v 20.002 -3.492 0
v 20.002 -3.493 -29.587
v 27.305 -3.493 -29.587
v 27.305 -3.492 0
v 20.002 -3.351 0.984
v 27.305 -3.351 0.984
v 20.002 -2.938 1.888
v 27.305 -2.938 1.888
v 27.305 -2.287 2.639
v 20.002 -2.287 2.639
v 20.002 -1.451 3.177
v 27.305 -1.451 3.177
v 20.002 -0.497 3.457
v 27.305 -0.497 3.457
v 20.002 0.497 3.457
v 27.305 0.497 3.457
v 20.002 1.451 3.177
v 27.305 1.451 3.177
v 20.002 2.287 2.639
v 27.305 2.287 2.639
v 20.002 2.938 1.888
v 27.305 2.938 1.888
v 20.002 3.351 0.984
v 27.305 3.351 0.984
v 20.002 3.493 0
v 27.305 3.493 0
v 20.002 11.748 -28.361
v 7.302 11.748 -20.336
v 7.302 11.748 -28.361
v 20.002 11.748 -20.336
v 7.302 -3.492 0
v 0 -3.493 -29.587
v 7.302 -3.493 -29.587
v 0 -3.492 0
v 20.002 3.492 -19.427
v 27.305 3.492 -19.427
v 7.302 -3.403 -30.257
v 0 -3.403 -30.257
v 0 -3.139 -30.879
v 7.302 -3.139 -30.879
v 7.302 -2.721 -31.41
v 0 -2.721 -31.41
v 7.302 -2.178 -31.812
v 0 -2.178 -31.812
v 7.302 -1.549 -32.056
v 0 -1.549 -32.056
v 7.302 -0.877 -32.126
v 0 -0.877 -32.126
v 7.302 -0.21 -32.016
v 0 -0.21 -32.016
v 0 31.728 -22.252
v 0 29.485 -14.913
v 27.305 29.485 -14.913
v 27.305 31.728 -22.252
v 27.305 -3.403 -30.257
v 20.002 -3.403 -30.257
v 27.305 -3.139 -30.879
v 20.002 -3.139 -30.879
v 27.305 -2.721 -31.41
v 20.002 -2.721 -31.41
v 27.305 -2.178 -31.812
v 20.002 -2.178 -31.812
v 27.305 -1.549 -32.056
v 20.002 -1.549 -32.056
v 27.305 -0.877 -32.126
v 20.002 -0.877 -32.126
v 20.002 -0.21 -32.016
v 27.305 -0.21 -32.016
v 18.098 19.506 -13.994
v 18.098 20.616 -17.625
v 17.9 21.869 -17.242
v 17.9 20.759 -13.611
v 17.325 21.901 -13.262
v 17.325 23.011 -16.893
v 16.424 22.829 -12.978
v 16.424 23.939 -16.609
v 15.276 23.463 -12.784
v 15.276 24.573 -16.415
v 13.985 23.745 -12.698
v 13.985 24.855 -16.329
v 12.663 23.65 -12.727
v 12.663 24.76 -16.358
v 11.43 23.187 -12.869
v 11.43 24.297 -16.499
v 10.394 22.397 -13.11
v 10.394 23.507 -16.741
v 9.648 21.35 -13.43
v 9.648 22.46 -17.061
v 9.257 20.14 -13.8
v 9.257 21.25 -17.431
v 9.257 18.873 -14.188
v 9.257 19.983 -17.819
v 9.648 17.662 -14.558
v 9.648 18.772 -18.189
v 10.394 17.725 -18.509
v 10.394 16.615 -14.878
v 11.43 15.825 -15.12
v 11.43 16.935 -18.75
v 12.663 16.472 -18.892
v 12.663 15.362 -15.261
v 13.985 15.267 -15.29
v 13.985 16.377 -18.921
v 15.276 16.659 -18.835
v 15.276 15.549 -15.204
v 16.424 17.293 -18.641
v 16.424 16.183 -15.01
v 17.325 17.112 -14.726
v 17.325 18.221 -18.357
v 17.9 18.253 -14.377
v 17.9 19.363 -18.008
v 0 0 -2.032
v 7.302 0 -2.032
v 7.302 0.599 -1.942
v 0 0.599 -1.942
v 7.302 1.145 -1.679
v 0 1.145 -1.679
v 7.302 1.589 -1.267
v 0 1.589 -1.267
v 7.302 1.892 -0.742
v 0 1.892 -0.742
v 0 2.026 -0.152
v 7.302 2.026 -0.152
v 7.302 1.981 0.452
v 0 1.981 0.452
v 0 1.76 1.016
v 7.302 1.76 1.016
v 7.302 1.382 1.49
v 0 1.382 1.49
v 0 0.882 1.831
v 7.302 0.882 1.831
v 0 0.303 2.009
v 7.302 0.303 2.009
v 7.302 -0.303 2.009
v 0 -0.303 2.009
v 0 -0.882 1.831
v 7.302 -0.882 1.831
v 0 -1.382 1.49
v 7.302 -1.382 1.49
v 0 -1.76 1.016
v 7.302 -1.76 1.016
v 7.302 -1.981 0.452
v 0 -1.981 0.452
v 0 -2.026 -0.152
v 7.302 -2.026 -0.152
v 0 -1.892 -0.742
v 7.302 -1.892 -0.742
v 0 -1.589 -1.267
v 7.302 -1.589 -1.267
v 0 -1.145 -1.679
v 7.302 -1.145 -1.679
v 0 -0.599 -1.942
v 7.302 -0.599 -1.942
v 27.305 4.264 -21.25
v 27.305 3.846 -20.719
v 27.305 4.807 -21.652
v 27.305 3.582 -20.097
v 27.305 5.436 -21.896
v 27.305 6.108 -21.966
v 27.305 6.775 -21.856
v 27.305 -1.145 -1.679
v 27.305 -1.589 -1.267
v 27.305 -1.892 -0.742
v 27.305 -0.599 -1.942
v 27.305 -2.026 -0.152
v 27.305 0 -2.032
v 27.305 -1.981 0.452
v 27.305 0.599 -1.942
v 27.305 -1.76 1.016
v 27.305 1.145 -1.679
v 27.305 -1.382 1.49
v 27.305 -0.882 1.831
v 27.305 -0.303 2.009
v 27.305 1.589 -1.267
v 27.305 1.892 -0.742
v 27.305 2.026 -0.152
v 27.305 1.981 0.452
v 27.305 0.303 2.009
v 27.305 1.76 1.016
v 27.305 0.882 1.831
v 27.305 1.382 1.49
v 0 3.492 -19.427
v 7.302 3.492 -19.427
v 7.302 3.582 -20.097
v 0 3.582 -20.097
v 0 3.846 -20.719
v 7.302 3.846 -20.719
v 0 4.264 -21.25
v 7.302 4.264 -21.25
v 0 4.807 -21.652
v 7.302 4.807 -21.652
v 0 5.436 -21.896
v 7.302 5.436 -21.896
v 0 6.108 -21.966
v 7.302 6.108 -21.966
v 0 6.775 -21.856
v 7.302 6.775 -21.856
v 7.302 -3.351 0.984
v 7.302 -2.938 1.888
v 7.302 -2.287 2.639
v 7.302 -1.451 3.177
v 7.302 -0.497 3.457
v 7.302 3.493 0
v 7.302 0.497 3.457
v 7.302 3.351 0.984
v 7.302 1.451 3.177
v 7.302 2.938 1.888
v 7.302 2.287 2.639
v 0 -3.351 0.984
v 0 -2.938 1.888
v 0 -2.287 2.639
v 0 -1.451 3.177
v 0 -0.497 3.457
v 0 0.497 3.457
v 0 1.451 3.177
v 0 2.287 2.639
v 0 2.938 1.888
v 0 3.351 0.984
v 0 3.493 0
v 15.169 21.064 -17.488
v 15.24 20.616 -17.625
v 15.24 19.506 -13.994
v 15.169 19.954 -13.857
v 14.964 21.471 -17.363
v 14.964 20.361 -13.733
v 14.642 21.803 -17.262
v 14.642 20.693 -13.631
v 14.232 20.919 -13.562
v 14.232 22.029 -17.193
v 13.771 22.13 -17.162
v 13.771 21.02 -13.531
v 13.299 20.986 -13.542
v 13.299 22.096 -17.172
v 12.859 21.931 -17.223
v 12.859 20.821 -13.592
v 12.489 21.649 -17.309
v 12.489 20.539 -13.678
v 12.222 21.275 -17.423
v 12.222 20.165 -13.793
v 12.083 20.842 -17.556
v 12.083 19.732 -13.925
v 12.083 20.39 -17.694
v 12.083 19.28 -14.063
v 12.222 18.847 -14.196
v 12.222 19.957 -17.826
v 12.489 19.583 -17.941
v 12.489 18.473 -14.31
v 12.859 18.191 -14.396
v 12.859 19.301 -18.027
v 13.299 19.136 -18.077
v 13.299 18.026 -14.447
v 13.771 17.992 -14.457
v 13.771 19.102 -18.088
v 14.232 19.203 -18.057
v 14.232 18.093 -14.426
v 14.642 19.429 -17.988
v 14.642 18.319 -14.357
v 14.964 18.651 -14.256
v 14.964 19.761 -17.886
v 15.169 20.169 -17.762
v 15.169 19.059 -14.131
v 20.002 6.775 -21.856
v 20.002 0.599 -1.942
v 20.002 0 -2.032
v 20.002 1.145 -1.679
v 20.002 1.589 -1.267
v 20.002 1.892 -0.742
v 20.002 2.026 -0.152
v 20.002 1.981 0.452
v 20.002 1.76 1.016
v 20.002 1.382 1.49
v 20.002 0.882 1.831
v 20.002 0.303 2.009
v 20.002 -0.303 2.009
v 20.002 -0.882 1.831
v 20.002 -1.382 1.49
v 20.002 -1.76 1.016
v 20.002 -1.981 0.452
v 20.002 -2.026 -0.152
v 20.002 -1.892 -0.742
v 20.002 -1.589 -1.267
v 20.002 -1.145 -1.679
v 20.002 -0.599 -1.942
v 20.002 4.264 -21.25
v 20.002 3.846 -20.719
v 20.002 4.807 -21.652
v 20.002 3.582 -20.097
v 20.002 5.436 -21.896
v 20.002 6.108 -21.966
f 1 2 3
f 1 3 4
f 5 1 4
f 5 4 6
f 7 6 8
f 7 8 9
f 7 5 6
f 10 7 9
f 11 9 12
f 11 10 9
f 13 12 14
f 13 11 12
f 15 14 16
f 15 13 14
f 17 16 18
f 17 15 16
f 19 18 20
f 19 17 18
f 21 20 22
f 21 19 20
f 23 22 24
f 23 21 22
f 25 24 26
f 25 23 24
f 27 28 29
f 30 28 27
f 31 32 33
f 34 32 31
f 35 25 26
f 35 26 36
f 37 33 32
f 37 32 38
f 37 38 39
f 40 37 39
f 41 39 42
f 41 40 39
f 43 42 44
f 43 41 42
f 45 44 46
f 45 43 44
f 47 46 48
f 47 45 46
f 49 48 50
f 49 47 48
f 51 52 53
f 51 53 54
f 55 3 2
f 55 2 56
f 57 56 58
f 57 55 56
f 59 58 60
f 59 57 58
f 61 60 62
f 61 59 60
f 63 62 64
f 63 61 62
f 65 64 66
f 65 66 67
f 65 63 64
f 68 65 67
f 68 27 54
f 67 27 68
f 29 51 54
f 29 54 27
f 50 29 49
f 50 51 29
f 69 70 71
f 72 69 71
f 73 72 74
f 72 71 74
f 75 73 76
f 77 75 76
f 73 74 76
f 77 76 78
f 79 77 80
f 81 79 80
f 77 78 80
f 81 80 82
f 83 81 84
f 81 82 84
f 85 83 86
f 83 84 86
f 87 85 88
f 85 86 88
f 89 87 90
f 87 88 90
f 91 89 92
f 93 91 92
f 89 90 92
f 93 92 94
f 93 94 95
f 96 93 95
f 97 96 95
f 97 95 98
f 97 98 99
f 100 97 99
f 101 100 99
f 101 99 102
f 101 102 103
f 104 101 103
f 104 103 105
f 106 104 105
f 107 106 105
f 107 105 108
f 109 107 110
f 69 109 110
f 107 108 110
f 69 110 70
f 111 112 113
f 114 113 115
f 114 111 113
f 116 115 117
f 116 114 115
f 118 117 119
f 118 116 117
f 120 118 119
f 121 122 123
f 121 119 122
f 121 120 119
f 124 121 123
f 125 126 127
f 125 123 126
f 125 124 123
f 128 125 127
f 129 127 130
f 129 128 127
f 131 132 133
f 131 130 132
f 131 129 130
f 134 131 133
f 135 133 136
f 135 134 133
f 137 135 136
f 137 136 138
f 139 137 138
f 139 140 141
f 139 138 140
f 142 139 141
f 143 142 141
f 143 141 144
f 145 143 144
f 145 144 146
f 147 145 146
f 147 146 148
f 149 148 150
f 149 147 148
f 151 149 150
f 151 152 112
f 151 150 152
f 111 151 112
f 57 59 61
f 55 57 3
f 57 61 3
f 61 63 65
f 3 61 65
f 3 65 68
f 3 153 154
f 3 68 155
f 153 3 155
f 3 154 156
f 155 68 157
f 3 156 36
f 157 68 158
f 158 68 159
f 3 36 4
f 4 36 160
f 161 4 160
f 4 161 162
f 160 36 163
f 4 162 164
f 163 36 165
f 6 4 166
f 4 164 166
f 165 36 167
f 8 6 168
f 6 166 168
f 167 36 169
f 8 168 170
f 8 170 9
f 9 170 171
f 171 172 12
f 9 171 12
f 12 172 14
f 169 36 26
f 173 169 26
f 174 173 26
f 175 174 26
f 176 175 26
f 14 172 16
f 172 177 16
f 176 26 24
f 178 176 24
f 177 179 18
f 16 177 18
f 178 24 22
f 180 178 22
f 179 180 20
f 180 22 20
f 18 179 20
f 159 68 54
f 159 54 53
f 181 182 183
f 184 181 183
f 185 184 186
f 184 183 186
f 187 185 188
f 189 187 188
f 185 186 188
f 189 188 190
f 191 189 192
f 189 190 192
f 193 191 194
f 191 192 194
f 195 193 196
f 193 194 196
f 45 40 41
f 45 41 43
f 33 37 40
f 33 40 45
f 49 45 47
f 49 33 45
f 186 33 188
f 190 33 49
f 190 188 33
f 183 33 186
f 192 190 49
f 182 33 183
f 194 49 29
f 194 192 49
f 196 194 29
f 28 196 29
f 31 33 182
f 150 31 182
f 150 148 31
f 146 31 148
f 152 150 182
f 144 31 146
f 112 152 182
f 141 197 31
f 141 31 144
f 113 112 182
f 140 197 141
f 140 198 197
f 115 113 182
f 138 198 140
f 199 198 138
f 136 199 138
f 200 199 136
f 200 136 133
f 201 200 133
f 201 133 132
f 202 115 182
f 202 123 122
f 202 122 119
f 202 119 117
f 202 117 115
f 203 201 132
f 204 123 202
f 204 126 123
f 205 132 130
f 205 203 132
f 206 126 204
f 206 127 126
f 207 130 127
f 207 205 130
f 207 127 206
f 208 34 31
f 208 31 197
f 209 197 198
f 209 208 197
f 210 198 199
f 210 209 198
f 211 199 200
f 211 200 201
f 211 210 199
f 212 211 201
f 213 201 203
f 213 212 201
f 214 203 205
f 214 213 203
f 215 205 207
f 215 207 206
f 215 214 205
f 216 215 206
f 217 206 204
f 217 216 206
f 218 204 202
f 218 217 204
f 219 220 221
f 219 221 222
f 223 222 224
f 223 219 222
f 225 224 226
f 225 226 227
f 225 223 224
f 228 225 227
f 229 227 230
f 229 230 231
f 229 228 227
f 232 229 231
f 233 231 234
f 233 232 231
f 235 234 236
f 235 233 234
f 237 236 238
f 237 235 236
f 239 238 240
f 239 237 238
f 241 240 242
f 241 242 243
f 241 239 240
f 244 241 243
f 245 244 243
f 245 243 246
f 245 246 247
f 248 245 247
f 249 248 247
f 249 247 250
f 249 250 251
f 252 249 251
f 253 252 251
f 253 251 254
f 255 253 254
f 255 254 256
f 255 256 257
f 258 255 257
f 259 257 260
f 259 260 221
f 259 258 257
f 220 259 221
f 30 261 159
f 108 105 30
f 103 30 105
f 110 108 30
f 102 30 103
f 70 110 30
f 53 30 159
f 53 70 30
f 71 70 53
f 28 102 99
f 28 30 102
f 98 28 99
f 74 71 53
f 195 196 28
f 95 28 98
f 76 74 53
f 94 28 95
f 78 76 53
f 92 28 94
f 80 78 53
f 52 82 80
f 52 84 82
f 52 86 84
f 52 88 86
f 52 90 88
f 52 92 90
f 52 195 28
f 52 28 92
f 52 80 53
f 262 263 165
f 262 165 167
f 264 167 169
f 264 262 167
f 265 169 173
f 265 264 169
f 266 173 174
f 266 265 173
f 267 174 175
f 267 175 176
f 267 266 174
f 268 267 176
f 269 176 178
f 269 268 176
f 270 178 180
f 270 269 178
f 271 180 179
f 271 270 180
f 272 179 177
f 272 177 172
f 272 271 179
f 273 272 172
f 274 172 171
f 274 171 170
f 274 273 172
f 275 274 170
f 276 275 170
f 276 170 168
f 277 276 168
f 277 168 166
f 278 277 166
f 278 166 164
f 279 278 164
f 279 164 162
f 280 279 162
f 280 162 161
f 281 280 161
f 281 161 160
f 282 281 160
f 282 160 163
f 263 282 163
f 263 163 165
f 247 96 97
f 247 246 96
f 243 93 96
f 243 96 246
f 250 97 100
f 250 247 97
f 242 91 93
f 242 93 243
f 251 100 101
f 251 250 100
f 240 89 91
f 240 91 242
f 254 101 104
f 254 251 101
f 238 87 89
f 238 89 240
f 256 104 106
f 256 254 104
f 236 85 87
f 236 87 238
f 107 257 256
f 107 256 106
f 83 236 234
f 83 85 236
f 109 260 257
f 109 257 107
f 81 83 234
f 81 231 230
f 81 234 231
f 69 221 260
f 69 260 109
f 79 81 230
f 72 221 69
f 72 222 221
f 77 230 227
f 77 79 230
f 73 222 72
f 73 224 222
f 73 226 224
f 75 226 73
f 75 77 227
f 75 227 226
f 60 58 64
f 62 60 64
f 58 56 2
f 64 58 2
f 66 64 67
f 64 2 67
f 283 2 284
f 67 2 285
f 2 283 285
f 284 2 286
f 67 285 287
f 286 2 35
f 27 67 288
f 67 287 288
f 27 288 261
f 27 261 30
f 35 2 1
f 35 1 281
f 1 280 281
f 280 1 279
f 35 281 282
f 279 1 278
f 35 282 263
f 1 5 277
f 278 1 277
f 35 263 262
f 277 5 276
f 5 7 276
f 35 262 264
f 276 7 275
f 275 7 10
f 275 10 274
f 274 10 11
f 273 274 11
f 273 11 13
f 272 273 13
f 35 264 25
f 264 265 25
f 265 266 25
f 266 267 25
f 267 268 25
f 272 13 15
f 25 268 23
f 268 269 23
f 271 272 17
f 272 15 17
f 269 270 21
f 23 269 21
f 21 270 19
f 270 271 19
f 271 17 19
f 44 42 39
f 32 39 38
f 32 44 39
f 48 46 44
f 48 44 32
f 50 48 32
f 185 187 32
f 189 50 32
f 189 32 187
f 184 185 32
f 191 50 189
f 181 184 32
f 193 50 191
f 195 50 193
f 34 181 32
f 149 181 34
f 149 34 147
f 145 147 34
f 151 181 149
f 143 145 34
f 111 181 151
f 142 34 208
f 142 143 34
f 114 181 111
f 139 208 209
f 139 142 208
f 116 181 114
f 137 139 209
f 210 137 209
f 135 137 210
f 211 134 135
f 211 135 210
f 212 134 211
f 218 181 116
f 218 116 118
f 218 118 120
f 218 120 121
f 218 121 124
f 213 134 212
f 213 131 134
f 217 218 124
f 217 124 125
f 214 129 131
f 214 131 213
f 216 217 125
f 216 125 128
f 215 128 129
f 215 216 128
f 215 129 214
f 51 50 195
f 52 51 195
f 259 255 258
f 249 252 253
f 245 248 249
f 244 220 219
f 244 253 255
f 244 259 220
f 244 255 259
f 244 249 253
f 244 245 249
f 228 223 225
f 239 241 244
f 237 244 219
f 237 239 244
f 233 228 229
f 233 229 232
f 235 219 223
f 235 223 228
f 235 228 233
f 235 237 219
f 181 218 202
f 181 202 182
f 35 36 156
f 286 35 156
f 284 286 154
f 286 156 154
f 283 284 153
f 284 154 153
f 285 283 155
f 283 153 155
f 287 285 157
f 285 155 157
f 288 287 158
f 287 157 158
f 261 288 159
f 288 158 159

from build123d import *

# Parameters (mm, degrees)
SKETCH1_R               = 2.032
BOSS_EXTRUDE1_DEPTH     = 27.305
FILLET1_R               = 2.54
SKETCH2_W               = 12.7
SKETCH2_H               = 15.24
CUT_EXTRUDE1_DEPTH      = 4.4925
CUT_EXTRUDE1_DEPTH_BACK = 33.127387008
SKETCH3_R               = 4.445
SKETCH3_R_2             = 1.5875
BOSS_EXTRUDE2_DEPTH     = 3.796503


with BuildPart() as part:
    # Sketch1 → Boss-Extrude1 (new body)
    with BuildSketch(Plane(origin=(0, 0, 0), x_dir=(0, 0, -1), z_dir=(1, 0, 0))):
        with BuildLine():
            Line((0, 3.4925), (22.86, 3.4925))
            Line((22.86, 3.4925), (14.913420462, 29.48459049))
            Line((14.913420462, 29.48459049), (22.251950115, 31.728204162))
            Line((22.251950115, 31.728204162), (33.02, -3.4925))
            Line((33.02, -3.4925), (0, -3.4925))
            ThreePointArc((0, -3.4925), (-3.4925, 0), (0, 3.4925))
        make_face()
        Circle(SKETCH1_R, mode=Mode.SUBTRACT)
    extrude(amount=BOSS_EXTRUDE1_DEPTH)

    # Fillet1
    fillet1_edges = [part.edges().sort_by_distance(p)[0] for p in [
        (13.6525, 3.4925, -22.86),
        (13.6525, -3.4925, -33.02),
    ]]
    fillet(fillet1_edges, radius=FILLET1_R)

    # Sketch2 → Cut-Extrude1 (cut, two sides)
    with BuildSketch(Plane.XY) as cut_extrude1_sk:
        with Locations((13.6525, 4.1275)):
            Rectangle(SKETCH2_W, SKETCH2_H)
    extrude(amount=CUT_EXTRUDE1_DEPTH, mode=Mode.SUBTRACT)
    extrude(cut_extrude1_sk.sketch, amount=-CUT_EXTRUDE1_DEPTH_BACK, mode=Mode.SUBTRACT)

    # Sketch3 → Boss-Extrude2 (add)
    with BuildSketch(Plane(origin=(0, 6.690118026, -21.882390062), x_dir=(1, 0, 0), z_dir=(0, -0.292371705, 0.956304756))):
        with Locations((13.6525, 14.562227295)):
            Circle(SKETCH3_R)
        with Locations((13.6525, 14.562227295)):
            Circle(SKETCH3_R_2, mode=Mode.SUBTRACT)
    extrude(amount=BOSS_EXTRUDE2_DEPTH)


solid = part.part
